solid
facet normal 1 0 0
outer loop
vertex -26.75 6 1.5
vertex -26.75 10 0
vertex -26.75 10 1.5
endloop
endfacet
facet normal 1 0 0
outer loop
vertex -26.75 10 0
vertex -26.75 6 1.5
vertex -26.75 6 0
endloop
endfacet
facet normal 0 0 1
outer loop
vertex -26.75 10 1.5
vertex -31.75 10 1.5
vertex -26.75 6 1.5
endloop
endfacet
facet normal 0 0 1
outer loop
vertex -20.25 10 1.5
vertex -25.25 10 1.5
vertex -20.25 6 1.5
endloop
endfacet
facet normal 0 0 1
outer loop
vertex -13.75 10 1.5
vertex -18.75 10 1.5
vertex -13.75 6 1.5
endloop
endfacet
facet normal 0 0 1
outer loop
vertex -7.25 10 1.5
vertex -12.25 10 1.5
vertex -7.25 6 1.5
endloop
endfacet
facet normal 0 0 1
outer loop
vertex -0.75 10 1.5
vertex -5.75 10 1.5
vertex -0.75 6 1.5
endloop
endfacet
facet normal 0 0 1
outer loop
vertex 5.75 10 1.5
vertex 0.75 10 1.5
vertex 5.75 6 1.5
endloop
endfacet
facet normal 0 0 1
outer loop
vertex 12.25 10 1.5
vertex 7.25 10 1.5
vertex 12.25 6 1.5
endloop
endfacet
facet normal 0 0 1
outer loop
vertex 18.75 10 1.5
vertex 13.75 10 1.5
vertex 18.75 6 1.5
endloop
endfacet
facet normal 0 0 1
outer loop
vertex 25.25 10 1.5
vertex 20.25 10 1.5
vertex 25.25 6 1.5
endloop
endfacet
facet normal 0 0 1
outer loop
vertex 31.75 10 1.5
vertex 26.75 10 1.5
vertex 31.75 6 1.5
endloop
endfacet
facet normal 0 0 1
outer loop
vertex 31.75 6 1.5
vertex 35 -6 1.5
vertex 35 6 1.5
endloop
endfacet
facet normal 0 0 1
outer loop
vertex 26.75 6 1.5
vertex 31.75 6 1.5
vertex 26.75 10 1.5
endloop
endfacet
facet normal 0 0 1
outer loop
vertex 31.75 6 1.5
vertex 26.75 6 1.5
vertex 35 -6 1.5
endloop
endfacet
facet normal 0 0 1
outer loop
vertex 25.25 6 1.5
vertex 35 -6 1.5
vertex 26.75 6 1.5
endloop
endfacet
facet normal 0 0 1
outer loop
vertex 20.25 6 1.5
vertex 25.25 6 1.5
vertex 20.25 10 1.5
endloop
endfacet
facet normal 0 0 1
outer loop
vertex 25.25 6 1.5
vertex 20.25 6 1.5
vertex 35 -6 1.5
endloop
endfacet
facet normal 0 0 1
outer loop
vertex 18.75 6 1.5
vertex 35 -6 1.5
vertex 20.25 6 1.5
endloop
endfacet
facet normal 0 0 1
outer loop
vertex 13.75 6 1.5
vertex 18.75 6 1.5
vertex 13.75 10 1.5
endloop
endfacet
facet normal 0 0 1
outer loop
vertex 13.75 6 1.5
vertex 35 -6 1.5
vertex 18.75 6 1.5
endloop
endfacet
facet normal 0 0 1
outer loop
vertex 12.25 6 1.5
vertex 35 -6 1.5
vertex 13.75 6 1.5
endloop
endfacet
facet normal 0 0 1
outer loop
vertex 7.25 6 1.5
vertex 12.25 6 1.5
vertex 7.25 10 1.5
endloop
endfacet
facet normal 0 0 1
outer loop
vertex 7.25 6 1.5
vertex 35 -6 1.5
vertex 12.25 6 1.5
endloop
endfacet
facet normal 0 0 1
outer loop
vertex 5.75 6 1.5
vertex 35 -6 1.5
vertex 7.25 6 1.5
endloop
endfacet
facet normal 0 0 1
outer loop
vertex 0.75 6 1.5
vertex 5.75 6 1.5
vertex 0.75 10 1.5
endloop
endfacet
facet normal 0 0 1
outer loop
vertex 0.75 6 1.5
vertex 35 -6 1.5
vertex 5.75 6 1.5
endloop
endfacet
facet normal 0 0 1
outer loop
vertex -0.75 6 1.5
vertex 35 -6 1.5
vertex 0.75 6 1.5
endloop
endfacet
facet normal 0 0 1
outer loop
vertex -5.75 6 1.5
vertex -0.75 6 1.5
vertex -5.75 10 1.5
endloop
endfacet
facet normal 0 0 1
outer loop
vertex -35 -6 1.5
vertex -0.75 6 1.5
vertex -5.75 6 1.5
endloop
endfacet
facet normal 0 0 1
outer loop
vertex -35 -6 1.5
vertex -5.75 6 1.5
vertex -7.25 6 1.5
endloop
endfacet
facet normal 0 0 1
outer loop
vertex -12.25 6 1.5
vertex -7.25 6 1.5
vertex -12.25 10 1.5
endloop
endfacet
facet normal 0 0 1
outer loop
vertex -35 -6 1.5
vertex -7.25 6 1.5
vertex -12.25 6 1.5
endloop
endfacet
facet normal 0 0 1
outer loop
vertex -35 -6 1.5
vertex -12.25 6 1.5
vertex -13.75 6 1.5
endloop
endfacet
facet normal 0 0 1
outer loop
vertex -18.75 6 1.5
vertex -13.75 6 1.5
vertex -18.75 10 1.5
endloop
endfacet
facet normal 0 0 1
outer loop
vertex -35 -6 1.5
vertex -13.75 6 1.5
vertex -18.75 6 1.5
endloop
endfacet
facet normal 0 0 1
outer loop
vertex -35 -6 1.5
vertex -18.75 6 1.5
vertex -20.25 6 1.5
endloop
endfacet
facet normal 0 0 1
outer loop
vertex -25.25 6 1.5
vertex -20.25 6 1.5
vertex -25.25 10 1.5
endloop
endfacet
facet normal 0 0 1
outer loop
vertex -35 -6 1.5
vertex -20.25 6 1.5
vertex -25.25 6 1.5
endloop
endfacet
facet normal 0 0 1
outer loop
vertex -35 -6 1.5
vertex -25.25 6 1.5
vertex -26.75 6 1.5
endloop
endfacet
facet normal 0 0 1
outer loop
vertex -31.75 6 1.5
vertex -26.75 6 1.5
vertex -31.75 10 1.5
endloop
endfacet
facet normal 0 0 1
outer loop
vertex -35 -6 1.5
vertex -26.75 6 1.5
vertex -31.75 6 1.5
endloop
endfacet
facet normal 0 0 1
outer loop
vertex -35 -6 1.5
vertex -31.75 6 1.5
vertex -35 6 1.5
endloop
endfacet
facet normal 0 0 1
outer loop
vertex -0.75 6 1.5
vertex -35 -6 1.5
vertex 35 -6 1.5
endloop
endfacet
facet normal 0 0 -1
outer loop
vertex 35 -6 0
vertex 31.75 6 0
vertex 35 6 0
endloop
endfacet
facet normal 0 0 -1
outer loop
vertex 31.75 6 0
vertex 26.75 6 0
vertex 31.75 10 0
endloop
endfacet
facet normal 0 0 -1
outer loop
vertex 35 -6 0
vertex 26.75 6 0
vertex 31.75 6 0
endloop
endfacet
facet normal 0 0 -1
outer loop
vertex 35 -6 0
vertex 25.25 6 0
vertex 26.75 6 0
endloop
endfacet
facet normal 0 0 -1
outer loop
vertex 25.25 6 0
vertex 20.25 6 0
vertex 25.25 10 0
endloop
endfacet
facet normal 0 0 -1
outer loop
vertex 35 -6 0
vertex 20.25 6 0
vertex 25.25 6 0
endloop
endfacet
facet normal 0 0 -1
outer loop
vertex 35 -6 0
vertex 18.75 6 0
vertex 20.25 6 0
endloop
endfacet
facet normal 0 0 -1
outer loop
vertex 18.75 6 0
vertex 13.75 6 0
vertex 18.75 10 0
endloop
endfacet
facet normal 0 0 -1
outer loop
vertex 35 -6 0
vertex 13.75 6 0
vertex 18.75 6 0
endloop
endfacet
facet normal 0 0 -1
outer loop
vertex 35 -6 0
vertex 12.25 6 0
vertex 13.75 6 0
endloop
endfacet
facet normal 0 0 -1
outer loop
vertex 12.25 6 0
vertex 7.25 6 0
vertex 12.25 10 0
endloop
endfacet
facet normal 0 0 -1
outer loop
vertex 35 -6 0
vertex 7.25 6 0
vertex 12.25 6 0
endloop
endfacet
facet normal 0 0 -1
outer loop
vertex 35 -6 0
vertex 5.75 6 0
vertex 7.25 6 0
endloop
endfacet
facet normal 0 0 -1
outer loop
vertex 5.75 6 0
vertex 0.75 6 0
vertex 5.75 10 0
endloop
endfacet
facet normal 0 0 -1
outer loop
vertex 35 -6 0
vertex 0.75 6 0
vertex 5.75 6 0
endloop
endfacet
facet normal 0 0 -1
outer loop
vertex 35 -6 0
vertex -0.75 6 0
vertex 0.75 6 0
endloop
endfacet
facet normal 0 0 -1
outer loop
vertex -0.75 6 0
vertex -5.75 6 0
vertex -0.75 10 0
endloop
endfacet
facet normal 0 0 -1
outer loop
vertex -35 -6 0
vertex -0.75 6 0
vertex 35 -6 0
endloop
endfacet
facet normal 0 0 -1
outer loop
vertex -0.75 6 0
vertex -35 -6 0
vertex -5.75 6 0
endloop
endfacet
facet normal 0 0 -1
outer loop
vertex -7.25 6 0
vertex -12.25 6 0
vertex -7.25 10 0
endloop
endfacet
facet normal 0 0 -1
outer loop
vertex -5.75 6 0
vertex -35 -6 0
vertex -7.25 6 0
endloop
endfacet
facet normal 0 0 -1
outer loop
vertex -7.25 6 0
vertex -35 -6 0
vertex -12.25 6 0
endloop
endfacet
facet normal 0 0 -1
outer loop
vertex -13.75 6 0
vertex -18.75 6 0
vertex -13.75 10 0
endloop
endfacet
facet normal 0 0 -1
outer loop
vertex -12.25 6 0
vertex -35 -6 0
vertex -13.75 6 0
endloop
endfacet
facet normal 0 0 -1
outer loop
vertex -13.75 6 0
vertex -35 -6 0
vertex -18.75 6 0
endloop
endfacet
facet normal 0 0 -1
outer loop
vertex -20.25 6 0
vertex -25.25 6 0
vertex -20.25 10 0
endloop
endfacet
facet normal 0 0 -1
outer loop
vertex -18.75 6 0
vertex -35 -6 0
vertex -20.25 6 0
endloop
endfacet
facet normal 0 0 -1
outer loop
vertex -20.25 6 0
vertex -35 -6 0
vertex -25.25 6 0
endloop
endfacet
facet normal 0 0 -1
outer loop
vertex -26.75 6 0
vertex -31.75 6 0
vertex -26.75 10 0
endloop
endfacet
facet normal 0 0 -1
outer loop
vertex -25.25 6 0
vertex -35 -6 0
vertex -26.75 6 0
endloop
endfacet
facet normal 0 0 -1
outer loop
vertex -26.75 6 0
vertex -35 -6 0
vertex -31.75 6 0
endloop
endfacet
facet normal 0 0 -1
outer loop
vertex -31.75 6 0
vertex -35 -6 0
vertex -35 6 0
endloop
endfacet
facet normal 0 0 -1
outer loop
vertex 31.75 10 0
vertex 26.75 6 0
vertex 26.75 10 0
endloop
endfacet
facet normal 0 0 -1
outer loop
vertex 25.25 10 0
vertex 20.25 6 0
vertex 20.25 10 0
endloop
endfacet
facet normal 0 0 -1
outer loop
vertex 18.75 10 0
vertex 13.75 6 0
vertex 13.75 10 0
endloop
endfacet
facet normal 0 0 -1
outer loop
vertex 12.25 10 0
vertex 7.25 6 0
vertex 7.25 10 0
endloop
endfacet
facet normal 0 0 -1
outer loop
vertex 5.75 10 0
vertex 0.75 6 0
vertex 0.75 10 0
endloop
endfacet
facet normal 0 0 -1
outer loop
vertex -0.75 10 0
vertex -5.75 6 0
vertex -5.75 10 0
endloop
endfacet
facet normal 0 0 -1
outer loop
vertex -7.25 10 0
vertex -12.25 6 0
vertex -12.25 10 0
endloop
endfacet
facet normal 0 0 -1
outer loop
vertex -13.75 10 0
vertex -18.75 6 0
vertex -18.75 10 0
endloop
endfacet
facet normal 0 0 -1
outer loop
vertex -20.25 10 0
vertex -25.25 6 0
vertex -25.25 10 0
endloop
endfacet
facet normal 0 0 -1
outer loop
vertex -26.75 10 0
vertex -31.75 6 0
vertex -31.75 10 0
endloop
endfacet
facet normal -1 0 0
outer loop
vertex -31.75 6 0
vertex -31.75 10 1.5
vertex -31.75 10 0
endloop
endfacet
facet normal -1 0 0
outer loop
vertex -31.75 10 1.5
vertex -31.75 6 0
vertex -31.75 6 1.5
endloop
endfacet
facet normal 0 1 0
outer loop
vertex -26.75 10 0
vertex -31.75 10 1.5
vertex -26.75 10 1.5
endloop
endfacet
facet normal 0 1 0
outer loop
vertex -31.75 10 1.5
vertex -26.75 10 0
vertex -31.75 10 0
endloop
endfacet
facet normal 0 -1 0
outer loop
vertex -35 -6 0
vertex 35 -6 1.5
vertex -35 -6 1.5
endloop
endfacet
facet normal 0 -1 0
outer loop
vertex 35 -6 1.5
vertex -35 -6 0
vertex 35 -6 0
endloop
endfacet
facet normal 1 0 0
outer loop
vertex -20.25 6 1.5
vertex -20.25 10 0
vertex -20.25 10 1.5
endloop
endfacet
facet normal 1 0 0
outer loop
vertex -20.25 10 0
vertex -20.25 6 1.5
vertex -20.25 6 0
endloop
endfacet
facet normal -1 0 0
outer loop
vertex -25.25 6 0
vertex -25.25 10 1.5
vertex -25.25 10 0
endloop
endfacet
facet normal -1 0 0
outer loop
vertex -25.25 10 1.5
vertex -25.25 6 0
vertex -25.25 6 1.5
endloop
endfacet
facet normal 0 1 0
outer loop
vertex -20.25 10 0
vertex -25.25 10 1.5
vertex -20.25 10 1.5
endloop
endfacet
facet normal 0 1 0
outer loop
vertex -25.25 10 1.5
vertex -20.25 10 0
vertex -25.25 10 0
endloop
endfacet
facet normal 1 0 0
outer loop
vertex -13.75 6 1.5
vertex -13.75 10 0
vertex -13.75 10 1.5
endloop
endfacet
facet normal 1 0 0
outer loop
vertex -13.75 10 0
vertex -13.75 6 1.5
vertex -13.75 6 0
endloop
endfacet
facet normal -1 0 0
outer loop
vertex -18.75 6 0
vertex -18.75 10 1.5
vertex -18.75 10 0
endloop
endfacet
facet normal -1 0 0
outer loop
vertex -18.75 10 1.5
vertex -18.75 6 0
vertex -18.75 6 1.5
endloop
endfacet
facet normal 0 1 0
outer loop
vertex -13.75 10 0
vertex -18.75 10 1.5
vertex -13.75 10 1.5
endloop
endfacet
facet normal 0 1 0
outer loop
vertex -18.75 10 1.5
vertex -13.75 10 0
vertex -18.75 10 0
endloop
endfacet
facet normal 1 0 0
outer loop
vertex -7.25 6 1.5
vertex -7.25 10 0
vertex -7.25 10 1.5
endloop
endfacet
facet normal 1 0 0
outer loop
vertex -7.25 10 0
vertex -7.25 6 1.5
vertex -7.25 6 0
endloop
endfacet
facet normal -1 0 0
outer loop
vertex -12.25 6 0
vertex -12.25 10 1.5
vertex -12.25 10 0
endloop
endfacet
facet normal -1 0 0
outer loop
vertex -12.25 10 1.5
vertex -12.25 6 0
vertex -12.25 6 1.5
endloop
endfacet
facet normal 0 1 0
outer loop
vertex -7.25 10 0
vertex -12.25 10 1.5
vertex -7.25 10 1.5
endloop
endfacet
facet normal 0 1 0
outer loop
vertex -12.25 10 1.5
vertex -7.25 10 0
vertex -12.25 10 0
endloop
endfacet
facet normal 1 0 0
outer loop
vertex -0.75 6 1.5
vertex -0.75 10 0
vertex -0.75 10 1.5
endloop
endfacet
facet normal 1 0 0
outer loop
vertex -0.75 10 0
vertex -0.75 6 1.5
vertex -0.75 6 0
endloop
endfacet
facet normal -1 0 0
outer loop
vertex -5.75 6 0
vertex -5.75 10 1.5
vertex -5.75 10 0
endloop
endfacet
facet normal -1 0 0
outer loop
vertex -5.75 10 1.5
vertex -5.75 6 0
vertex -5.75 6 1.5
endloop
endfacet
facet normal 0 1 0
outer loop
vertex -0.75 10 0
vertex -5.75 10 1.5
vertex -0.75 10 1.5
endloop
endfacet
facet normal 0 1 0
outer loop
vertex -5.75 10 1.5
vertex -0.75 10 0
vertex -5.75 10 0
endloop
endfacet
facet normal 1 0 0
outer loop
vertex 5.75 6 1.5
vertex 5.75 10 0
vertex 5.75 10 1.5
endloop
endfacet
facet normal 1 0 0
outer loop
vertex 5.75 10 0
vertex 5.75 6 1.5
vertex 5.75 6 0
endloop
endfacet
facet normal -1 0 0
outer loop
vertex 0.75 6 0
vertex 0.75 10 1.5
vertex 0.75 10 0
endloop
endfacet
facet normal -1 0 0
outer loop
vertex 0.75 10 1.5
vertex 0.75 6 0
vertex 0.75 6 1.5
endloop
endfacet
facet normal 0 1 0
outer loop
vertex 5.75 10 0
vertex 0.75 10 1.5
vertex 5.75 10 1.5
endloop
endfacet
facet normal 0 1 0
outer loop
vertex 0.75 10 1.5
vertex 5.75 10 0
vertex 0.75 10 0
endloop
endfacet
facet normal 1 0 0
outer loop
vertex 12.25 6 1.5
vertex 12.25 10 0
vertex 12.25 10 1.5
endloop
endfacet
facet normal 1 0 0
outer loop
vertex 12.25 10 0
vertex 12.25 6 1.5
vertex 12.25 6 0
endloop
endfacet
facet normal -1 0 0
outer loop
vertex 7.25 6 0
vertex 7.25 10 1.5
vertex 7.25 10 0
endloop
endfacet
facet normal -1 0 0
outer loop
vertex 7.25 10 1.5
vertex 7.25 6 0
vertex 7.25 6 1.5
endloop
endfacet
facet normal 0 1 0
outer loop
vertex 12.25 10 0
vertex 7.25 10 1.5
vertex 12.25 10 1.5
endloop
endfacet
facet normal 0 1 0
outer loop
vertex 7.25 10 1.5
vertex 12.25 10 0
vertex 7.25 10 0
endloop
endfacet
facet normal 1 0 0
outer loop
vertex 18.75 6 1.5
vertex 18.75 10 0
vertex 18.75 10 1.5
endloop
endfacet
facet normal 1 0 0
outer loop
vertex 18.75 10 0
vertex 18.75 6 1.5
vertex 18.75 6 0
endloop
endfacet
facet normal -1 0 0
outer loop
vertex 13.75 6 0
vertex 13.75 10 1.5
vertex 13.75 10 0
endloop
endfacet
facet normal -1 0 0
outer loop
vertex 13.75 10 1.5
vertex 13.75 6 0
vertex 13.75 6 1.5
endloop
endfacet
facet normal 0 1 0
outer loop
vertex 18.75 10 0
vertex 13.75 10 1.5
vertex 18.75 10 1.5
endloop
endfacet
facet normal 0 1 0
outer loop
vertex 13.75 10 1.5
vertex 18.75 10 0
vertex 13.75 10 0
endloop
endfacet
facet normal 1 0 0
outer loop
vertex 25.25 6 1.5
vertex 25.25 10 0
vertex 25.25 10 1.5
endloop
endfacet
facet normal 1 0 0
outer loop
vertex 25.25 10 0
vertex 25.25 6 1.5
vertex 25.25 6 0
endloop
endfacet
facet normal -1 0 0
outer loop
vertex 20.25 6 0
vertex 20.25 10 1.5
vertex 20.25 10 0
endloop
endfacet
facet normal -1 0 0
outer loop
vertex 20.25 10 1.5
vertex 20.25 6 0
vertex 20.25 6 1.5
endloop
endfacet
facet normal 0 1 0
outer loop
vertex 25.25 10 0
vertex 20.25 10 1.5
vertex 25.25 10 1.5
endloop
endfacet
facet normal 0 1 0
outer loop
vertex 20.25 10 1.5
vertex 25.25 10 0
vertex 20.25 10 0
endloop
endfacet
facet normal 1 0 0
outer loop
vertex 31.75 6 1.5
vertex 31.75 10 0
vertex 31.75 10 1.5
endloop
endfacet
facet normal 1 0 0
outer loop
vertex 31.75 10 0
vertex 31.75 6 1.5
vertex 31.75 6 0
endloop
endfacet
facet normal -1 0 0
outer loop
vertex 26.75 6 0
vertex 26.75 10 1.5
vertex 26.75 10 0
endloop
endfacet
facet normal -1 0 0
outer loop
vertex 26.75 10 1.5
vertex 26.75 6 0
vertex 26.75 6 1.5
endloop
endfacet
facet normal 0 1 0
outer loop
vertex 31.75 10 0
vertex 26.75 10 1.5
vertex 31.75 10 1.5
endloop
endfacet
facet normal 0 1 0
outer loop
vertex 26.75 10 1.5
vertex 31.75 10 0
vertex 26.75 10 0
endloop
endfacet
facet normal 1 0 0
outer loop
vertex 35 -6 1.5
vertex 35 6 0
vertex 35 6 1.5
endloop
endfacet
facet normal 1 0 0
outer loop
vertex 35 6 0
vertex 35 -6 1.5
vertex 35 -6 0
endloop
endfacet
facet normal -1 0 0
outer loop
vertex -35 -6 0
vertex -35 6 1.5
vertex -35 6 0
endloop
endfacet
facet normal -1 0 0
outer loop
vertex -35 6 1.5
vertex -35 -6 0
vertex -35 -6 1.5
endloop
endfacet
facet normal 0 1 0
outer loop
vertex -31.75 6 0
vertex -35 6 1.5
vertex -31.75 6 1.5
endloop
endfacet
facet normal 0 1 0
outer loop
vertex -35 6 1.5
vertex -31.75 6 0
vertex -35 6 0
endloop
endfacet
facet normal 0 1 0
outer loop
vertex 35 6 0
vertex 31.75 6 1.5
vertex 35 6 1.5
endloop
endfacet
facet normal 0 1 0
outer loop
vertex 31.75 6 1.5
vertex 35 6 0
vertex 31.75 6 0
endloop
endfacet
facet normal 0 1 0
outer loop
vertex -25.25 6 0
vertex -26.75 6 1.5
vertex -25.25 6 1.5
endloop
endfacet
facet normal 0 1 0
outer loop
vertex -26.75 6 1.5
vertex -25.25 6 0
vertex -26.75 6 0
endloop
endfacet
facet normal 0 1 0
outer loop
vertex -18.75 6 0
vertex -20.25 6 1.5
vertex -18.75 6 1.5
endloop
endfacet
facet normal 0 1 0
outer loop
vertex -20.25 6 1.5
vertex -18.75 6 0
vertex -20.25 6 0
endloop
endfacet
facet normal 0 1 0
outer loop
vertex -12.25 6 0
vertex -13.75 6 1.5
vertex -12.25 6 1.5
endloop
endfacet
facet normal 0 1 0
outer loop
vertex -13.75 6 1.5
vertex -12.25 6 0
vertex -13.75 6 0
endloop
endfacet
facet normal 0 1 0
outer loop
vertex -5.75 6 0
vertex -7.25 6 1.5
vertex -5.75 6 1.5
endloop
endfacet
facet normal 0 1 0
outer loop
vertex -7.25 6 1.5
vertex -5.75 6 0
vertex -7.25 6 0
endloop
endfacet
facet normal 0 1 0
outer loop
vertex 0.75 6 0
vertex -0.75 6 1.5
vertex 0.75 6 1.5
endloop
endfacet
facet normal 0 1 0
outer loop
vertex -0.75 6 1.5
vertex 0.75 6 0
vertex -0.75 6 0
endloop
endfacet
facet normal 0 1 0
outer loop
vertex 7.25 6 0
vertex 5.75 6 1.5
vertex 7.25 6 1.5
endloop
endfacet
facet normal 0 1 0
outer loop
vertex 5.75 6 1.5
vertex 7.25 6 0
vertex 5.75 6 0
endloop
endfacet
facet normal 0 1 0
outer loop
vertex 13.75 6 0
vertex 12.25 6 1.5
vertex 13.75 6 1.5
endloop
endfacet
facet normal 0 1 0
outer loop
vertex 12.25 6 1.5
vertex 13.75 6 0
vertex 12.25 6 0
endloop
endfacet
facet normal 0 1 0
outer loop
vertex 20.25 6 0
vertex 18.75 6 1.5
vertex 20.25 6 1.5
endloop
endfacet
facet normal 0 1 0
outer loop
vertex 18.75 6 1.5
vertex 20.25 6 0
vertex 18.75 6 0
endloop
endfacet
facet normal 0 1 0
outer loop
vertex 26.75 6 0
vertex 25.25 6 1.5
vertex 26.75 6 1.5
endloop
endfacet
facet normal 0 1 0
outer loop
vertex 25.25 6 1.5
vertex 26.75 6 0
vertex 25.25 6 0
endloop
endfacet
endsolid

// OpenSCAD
// 10-well comb for casting agarose gels
// Print orientation: flat on bed, teeth pointing down (-Z)

// ---------- Parameters ----------
plate_t      = 1.5;   // plate thickness (Z)
spine_len    = 70;    // spine length (X)
spine_w      = 12;    // spine width (Y)
tooth_w      = 5.0;   // tooth width (X)
tooth_len    = 12;    // tooth length (Y)
tooth_count  = 10;    // number of teeth
gap          = 1.5;   // gap between teeth (X)
overhang     = 4;     // tooth extension past front edge (Y)

$fn = 64;

// ---------- Derived ----------
pitch   = tooth_w + gap;          // centre-to-centre spacing
x_start = -(tooth_count - 1) * pitch / 2;  // first tooth centre (row centred)

// ---------- Model ----------
union() {
    // Spine (back bar)
    translate([-spine_len / 2, -spine_w / 2, 0])
        cube([spine_len, spine_w, plate_t]);

    // Teeth
    for (i = [0 : tooth_count - 1])
        translate([x_start + i * pitch - tooth_w / 2,
                   spine_w / 2 - tooth_len,
                   0])
            cube([tooth_w, tooth_len + overhang, plate_t]);
}
